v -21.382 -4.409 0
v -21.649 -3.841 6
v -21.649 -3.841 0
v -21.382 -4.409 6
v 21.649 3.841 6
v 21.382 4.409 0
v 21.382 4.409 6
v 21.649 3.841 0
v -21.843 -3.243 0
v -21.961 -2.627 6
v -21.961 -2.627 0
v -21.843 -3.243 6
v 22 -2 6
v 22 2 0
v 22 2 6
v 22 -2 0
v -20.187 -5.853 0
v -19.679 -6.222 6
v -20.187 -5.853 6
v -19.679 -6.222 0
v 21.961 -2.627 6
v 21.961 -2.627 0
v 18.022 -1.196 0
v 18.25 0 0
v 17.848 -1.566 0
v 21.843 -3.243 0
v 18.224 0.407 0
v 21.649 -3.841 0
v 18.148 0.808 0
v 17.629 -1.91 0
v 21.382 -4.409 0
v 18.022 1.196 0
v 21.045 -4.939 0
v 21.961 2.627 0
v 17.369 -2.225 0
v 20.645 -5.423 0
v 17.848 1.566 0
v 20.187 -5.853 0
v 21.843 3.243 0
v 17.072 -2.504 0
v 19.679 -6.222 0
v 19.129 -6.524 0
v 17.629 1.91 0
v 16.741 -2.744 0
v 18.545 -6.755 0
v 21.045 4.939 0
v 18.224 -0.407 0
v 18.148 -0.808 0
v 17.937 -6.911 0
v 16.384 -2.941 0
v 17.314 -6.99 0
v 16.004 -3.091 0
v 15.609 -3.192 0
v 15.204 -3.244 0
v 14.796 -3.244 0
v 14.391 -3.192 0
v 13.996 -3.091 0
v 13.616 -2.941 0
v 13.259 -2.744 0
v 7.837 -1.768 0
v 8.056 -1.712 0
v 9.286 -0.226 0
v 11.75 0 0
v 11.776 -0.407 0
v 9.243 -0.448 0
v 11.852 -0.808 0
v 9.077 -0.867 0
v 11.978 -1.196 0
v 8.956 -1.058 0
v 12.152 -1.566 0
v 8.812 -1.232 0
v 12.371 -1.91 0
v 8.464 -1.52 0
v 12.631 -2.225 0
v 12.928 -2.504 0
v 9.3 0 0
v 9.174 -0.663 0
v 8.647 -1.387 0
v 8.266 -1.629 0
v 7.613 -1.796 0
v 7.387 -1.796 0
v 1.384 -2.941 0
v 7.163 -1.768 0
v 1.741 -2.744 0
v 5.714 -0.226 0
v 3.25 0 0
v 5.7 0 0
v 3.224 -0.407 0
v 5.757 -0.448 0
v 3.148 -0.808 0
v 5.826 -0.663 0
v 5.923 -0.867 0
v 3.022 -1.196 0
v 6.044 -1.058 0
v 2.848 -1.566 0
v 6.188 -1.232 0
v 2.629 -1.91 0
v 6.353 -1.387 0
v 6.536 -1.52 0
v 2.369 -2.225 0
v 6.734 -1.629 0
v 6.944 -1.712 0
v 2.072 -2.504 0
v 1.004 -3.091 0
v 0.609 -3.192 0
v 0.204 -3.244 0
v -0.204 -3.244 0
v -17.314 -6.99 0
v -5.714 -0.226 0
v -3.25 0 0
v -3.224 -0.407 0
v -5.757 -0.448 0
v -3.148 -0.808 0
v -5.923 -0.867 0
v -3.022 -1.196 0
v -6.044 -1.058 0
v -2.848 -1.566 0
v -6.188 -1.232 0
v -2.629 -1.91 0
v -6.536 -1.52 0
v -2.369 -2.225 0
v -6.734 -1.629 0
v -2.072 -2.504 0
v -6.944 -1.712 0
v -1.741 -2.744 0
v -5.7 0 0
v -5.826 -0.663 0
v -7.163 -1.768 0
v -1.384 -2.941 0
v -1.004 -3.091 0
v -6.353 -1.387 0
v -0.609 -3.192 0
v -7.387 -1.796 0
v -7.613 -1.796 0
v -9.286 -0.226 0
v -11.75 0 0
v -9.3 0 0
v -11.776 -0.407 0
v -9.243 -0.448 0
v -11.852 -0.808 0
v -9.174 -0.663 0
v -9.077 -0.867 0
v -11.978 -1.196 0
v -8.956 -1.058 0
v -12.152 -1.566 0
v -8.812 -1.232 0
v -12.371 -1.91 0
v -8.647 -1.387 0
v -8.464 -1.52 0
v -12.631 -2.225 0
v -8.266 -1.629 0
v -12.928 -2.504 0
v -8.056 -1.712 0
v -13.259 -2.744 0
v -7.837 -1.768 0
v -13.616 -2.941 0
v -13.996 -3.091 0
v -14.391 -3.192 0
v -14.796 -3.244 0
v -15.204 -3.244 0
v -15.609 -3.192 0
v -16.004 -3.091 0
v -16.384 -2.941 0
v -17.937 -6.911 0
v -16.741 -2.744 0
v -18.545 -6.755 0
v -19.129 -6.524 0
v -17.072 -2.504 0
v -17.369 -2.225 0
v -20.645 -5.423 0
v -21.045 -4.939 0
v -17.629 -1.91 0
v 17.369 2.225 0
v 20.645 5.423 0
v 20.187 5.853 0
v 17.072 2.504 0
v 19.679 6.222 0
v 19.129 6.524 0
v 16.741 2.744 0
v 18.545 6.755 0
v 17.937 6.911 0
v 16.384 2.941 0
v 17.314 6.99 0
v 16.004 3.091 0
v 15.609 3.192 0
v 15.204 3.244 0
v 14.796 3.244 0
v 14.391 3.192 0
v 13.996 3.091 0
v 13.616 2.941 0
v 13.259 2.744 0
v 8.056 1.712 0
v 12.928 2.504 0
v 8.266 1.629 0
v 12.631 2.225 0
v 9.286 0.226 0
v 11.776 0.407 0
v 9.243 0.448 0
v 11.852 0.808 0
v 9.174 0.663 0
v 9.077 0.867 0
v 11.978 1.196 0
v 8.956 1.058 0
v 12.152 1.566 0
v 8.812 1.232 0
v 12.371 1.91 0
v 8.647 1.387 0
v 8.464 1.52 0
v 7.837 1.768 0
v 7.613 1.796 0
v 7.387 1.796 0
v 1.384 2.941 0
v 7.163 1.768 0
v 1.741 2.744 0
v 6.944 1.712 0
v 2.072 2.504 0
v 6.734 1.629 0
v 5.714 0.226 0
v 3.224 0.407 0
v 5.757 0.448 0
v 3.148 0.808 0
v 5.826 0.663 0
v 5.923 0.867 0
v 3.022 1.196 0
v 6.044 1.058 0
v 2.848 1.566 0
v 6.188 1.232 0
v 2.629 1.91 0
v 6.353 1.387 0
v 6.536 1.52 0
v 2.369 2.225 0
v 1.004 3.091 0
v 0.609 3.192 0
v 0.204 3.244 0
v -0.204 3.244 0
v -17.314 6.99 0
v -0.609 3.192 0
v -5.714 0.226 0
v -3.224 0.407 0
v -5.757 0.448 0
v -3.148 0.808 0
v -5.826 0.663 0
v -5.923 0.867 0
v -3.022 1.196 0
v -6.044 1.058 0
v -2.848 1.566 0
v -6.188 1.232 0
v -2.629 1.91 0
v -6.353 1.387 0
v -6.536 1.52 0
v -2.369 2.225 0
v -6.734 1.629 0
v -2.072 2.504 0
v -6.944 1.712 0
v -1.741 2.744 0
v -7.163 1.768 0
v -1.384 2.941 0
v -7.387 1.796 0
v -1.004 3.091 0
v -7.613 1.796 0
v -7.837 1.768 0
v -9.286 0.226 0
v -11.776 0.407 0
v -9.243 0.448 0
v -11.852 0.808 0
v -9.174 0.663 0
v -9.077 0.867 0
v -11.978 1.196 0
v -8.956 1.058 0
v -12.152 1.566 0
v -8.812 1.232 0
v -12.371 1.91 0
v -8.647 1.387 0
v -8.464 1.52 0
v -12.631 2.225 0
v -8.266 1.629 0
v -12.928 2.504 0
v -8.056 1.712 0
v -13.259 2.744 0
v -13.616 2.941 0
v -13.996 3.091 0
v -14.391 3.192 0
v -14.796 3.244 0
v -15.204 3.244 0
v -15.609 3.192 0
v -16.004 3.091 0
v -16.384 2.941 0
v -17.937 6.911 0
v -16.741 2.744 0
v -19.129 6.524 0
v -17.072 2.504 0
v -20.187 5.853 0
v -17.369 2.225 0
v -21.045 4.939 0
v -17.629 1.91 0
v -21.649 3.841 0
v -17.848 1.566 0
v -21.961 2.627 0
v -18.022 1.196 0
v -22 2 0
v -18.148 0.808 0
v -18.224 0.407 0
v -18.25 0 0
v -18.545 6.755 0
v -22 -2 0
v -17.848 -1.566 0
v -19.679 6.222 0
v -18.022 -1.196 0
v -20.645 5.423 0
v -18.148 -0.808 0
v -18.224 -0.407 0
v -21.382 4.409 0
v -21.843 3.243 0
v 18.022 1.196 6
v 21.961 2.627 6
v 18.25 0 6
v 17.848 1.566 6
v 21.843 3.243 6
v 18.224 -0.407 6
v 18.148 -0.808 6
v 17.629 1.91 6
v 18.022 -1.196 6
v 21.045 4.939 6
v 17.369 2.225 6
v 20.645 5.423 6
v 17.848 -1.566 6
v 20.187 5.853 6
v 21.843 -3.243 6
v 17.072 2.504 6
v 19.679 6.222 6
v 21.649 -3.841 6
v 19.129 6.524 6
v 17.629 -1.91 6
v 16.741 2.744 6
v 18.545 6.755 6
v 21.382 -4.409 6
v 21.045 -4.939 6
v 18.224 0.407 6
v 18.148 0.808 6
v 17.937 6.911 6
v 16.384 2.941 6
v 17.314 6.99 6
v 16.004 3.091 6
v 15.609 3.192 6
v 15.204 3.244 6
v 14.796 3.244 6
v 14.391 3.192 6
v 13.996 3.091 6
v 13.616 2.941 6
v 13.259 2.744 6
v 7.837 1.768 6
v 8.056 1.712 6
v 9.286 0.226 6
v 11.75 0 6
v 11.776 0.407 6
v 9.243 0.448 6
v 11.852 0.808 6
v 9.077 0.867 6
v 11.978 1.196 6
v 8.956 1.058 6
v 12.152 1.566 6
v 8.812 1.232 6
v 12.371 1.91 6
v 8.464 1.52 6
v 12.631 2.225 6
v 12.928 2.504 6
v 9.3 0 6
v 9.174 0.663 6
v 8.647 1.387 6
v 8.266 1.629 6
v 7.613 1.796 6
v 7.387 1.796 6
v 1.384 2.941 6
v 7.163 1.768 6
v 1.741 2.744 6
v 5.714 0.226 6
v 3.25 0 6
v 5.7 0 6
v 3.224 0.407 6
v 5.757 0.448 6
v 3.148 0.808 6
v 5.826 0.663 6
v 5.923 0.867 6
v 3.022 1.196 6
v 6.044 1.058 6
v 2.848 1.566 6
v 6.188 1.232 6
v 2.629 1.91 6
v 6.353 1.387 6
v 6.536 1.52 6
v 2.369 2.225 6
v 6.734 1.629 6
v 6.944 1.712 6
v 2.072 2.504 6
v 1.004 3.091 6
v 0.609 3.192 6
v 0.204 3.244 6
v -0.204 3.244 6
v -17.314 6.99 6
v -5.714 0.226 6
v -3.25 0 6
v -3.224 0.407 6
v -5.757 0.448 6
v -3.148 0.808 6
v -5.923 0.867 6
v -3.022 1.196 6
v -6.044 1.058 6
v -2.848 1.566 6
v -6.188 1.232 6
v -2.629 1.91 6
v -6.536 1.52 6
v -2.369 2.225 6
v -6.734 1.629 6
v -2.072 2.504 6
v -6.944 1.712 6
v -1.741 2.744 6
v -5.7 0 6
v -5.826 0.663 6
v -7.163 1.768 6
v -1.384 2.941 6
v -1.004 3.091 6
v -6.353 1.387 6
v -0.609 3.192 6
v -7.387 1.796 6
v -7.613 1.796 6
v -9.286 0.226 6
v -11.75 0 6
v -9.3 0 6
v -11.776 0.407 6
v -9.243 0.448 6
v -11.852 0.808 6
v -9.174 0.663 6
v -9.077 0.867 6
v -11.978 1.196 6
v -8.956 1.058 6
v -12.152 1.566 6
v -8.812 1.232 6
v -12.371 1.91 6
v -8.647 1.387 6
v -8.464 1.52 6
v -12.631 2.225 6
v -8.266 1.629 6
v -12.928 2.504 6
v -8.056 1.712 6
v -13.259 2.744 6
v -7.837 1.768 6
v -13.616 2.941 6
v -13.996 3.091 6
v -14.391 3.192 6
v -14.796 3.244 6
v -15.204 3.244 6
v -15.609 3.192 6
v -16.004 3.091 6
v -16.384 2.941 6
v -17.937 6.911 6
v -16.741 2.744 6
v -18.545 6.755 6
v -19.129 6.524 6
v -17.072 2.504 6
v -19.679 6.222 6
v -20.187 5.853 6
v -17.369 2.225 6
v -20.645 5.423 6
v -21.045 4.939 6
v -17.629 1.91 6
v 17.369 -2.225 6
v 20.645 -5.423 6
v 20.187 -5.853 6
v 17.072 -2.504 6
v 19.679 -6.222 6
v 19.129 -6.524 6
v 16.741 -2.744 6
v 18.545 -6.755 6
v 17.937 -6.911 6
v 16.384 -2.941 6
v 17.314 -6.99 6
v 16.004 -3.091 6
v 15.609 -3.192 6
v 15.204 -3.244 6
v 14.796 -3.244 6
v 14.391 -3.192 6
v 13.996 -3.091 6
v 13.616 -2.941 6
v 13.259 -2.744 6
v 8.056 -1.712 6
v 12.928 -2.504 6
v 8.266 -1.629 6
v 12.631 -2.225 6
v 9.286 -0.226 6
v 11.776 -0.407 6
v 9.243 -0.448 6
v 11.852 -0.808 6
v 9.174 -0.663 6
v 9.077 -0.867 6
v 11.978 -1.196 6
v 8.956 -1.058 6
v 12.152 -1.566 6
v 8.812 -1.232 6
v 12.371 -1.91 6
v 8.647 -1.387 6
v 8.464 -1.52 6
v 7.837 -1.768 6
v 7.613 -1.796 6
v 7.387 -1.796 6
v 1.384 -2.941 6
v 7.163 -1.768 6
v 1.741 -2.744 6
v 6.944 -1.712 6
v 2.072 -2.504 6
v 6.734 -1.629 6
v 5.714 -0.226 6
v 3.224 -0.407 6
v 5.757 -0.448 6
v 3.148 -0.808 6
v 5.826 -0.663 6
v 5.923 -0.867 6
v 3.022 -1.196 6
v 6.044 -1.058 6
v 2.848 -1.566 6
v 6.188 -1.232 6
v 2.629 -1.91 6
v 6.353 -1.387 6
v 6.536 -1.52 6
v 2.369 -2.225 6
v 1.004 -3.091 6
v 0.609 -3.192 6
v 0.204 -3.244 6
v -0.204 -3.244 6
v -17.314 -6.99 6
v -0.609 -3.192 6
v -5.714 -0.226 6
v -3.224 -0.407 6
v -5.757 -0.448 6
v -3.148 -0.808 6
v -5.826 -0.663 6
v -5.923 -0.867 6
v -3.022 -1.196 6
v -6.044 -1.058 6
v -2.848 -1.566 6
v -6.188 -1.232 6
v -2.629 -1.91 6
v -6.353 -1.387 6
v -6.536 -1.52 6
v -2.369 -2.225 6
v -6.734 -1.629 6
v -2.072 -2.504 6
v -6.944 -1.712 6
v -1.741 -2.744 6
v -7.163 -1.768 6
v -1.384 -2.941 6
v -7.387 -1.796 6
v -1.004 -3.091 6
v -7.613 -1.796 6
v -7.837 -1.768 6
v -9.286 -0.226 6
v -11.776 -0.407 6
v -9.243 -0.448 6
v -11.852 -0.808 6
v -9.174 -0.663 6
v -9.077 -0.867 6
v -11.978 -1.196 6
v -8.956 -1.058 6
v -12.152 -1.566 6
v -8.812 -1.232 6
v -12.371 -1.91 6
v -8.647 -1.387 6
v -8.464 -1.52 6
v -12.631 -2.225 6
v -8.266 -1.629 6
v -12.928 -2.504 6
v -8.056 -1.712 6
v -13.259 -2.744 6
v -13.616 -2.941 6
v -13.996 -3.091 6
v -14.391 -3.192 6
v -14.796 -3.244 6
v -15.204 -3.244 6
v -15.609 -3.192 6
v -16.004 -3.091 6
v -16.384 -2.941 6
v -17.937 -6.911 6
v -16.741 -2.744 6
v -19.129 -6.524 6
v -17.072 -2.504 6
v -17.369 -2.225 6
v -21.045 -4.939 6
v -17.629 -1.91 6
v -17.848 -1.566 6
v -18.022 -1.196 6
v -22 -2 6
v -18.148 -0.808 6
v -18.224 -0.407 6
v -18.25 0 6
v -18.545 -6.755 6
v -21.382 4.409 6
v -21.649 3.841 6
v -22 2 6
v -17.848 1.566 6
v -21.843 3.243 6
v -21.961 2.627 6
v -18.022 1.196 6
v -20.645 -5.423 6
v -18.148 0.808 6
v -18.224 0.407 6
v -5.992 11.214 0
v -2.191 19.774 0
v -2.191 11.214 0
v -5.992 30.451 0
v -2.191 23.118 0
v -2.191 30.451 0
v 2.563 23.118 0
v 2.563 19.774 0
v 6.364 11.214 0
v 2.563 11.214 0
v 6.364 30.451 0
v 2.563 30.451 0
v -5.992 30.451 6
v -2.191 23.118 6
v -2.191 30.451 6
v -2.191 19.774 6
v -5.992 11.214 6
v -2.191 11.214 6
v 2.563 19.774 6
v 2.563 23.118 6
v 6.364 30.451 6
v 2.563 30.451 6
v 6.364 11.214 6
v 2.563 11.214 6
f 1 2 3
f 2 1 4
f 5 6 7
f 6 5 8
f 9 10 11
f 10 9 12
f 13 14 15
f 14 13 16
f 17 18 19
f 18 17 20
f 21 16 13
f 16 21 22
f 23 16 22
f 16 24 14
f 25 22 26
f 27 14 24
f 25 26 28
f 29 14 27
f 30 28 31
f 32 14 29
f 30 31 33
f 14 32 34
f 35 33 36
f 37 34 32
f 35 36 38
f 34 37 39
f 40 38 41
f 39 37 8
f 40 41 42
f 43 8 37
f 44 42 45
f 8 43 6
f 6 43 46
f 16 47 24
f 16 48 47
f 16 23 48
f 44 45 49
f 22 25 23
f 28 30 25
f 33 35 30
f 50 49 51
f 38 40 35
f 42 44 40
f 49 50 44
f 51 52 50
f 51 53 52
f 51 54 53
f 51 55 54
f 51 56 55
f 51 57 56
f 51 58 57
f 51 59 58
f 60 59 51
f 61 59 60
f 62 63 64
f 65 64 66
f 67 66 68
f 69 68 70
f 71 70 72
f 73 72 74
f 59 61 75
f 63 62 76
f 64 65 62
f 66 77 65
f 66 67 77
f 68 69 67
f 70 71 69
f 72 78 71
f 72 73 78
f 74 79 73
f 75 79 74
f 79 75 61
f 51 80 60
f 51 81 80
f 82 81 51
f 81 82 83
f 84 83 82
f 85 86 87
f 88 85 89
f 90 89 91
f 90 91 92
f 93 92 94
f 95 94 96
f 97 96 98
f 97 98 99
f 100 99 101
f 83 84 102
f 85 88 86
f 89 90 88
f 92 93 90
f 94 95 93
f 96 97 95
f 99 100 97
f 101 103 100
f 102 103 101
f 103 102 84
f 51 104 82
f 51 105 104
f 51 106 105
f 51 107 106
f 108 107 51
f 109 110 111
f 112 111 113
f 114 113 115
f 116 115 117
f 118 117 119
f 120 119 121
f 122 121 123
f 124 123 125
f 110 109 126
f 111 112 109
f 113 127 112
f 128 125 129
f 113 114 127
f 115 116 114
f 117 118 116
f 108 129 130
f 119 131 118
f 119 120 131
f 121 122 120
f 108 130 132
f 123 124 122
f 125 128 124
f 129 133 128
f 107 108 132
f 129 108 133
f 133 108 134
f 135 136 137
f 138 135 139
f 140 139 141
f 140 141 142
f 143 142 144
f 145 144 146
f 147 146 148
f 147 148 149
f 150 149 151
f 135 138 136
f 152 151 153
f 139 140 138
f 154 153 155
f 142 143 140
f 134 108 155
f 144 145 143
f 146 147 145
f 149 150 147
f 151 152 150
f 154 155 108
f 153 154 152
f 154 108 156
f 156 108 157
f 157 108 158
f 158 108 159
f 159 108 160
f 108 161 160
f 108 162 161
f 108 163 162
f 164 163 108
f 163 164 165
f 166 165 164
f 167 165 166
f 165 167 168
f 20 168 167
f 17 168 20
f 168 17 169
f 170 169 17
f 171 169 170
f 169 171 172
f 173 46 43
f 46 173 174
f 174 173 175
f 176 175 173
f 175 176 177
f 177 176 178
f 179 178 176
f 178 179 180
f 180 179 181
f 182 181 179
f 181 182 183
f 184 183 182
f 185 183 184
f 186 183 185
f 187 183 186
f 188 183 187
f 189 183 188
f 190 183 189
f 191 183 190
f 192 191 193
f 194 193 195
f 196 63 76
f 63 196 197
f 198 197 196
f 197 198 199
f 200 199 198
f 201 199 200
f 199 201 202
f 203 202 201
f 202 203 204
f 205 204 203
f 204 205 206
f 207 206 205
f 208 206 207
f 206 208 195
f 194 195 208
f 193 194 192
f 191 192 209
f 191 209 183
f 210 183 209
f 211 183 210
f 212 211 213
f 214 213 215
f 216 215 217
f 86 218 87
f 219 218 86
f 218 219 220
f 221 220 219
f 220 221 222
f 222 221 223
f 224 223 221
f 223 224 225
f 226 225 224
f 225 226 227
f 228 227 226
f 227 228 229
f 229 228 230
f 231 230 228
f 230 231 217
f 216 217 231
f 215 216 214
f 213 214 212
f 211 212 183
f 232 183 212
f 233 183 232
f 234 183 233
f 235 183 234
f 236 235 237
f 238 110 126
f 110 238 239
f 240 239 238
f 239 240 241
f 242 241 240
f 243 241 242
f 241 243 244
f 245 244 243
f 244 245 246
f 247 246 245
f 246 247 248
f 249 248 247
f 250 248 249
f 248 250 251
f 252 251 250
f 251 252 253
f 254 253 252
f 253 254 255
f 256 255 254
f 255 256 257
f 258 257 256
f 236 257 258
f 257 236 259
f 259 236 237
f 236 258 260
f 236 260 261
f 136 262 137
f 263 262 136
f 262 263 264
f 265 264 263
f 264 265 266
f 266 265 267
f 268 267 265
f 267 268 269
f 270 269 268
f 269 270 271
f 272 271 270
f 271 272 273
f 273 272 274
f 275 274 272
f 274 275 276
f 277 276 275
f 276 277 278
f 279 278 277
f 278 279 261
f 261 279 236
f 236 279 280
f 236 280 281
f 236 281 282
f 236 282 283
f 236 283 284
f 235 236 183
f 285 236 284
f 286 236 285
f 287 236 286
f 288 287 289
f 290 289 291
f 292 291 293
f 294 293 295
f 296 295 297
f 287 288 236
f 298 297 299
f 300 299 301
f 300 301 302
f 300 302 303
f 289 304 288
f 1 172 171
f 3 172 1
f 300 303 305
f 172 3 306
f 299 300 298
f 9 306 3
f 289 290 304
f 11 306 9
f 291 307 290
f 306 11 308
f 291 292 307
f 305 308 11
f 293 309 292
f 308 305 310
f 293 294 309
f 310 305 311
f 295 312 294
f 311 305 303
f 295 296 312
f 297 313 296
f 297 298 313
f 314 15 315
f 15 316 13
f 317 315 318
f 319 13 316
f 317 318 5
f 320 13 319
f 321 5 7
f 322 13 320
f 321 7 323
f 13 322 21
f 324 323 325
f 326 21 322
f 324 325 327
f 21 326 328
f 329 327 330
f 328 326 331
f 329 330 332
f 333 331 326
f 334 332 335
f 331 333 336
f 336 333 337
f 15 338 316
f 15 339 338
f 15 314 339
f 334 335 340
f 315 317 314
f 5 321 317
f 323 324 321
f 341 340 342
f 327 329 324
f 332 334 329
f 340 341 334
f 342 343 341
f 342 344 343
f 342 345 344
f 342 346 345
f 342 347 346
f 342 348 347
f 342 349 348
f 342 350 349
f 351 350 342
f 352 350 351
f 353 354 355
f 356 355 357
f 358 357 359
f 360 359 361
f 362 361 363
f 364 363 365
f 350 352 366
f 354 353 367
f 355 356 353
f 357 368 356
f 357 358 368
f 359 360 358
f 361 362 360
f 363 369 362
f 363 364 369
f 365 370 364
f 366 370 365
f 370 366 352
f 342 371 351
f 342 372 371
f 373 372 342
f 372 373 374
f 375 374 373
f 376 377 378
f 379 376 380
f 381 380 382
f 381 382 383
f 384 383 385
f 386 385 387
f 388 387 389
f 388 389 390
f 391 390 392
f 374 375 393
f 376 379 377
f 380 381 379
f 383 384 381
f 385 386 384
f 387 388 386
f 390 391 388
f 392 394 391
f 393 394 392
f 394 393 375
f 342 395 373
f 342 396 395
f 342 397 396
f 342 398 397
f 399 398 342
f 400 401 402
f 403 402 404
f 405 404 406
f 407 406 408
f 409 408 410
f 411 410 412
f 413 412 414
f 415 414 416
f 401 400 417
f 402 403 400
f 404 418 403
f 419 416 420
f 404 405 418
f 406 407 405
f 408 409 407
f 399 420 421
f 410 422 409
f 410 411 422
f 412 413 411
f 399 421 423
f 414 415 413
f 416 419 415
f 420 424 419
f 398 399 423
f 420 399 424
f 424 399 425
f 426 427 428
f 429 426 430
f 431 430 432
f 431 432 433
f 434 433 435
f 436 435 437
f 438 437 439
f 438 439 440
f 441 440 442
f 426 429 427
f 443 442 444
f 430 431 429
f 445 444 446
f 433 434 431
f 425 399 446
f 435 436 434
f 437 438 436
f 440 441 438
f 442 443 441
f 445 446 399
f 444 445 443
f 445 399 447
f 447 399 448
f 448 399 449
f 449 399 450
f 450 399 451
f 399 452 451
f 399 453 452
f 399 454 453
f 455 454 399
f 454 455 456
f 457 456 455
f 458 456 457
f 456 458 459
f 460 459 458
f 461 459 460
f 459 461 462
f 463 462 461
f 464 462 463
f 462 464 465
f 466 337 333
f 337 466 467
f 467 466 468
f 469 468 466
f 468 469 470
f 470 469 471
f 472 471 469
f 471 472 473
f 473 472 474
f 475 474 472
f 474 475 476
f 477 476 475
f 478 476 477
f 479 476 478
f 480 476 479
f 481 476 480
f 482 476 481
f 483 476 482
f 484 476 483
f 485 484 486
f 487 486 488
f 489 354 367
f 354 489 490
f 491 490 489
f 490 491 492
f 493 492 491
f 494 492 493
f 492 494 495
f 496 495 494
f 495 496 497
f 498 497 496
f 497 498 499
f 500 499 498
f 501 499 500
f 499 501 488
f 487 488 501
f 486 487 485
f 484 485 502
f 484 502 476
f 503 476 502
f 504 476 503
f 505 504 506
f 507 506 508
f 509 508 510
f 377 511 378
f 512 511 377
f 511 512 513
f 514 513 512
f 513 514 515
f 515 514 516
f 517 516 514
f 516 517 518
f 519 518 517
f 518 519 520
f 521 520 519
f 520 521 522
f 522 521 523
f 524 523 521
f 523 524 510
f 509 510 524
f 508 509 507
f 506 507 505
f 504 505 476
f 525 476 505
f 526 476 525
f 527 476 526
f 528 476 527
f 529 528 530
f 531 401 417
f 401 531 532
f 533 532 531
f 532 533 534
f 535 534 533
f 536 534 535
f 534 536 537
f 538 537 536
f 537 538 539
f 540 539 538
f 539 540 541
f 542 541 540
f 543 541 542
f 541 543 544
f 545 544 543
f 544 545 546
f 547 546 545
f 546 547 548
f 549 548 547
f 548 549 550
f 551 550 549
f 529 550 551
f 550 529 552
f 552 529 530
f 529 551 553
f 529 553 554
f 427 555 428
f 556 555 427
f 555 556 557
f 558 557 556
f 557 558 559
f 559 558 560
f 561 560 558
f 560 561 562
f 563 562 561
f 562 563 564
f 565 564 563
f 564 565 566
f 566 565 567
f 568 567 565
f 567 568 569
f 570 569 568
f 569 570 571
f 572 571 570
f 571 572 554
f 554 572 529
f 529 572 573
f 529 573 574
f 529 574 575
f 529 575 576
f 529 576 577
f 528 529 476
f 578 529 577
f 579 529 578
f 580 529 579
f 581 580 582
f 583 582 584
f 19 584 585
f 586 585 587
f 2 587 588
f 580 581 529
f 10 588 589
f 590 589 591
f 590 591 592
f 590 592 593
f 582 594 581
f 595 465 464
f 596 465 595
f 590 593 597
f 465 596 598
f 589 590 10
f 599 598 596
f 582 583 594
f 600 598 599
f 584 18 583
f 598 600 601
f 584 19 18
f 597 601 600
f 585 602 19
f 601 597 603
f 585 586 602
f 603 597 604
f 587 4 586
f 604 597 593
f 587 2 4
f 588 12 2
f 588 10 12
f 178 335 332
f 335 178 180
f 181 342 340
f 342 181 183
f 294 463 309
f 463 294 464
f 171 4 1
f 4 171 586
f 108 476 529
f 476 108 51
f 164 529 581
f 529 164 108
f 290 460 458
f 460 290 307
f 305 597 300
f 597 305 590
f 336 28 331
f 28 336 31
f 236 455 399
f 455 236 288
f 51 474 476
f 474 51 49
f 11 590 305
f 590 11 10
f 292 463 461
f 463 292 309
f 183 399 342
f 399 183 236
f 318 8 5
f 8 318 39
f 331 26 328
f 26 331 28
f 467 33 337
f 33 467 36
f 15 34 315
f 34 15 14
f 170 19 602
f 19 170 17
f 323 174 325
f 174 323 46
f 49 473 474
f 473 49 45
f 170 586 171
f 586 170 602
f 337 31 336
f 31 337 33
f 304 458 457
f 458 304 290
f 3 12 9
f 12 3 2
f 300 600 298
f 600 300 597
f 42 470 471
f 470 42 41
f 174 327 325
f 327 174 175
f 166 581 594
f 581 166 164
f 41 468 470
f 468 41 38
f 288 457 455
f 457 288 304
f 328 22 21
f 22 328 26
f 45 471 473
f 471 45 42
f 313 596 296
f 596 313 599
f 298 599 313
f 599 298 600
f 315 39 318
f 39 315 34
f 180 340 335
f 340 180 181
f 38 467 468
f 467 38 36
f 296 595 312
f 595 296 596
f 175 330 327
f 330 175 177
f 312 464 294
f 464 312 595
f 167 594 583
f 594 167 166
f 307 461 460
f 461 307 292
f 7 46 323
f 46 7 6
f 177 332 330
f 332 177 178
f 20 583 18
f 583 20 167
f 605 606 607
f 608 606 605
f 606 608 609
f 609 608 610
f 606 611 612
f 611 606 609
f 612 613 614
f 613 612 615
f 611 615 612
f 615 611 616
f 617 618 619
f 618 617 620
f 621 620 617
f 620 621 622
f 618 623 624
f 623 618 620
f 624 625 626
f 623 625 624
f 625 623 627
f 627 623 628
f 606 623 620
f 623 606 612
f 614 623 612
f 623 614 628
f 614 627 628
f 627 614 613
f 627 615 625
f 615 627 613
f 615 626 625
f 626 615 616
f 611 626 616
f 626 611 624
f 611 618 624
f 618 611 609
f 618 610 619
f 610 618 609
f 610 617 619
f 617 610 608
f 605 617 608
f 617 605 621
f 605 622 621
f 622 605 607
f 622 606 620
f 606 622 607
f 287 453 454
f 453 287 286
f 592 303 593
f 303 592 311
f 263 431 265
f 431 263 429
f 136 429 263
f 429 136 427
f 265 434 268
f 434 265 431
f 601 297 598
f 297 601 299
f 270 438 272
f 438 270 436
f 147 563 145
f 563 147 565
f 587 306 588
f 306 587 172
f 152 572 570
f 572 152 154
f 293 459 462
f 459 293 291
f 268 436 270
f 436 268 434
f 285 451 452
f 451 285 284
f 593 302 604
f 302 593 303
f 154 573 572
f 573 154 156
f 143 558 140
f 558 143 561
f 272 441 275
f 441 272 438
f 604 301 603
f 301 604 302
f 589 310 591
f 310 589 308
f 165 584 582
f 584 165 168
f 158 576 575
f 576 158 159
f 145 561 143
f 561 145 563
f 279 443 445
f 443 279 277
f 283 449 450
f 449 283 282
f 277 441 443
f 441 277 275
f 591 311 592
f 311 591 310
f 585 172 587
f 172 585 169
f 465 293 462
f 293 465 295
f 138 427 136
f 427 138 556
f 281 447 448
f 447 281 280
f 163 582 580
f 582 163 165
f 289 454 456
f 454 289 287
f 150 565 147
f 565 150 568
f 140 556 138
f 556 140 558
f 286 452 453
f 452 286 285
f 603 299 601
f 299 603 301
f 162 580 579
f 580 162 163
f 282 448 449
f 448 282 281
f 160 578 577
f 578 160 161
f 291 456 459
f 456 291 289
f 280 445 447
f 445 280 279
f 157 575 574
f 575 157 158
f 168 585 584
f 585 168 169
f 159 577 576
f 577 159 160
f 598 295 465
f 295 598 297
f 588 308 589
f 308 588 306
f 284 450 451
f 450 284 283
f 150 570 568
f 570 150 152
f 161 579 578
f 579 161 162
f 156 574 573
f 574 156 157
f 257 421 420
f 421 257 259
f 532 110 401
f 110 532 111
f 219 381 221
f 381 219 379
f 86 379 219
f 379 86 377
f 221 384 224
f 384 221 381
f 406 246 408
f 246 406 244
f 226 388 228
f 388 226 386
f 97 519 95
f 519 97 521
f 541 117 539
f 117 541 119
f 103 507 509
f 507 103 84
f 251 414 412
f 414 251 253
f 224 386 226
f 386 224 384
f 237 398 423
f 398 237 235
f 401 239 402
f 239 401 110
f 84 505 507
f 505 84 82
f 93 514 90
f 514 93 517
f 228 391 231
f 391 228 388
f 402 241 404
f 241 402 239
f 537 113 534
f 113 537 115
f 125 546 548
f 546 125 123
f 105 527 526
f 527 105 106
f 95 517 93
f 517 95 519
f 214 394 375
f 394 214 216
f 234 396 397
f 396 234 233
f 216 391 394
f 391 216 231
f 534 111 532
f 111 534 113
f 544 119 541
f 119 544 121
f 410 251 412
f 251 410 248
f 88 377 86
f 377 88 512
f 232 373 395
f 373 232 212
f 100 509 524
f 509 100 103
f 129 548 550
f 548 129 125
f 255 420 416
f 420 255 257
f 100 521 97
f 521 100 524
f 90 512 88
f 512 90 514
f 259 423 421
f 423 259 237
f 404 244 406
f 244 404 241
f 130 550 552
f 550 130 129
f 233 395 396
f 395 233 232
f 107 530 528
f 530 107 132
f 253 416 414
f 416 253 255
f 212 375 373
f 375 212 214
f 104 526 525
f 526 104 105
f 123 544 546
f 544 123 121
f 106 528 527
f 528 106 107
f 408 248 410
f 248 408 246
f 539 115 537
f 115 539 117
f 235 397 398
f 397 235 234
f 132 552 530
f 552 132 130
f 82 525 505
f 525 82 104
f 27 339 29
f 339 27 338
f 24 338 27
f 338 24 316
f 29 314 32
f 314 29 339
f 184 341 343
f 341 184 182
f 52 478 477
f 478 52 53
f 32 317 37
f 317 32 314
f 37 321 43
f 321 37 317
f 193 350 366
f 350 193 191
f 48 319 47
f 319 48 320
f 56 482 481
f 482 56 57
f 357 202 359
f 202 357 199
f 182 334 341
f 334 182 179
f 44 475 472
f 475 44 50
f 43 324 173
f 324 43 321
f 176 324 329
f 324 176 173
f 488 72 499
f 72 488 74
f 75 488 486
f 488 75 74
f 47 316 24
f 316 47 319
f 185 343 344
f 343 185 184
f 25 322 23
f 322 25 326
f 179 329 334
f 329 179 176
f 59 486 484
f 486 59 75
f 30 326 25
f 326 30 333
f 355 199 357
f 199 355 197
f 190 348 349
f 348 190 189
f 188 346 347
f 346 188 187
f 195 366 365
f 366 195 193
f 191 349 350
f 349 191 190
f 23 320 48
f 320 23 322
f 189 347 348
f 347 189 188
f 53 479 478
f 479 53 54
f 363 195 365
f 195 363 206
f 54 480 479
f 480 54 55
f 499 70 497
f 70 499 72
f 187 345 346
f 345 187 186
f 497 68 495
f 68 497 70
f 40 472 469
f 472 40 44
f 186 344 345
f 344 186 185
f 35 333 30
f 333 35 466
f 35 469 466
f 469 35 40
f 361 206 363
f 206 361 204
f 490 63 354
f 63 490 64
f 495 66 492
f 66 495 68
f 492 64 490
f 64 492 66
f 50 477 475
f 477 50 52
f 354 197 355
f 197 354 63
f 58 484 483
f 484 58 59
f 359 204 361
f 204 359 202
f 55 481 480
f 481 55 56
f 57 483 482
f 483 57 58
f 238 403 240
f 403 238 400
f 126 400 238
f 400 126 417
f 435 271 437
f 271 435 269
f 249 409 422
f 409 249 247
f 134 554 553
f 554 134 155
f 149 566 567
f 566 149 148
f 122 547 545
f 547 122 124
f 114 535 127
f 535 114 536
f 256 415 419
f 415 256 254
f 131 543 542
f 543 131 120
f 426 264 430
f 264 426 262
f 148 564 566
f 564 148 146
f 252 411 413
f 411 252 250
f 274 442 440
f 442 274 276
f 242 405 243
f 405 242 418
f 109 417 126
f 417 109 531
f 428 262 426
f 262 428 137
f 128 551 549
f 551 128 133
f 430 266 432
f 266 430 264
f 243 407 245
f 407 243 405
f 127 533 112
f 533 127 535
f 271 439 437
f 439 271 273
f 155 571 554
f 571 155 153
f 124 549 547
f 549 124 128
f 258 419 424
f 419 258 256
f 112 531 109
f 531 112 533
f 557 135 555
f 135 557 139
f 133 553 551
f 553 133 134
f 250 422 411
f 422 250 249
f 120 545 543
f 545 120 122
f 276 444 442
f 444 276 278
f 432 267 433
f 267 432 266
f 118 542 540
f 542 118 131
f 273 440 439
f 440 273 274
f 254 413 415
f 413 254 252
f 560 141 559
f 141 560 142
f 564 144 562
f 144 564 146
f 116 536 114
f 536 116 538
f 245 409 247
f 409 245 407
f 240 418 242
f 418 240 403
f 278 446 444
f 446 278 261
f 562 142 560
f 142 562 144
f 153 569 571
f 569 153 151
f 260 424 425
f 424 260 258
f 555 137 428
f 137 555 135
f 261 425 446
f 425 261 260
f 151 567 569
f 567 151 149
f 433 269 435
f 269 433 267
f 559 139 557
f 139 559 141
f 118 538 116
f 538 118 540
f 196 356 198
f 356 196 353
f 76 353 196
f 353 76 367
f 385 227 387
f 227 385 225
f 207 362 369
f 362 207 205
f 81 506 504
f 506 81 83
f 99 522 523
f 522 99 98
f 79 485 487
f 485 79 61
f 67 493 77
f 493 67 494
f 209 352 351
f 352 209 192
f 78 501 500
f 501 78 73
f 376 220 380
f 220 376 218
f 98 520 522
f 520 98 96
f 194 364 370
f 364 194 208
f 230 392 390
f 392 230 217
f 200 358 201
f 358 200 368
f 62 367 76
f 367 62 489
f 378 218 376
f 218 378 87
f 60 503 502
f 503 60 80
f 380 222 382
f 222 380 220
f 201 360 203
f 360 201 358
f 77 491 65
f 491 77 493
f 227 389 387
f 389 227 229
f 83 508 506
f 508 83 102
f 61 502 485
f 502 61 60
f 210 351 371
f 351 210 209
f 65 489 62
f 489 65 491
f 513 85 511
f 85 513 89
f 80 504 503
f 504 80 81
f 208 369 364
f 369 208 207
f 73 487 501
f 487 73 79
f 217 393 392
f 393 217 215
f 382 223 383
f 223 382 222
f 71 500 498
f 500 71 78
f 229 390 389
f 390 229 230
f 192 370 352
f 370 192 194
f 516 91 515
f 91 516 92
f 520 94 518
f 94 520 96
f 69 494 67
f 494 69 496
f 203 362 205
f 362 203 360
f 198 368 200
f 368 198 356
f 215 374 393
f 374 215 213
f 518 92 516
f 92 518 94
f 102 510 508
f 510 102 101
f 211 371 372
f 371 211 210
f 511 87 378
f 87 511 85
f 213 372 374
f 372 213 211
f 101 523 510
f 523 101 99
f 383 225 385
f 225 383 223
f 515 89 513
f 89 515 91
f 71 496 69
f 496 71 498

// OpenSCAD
$fn = 50;


difference() {
	union() {
		hull() {
			translate(v = [-17.0000000000, 2.0000000000, 0]) {
				cylinder(h = 6, r = 5);
			}
			translate(v = [17.0000000000, 2.0000000000, 0]) {
				cylinder(h = 6, r = 5);
			}
			translate(v = [-17.0000000000, -2.0000000000, 0]) {
				cylinder(h = 6, r = 5);
			}
			translate(v = [17.0000000000, -2.0000000000, 0]) {
				cylinder(h = 6, r = 5);
			}
		}
		translate(v = [0, 30.0000000000, 0]) {
			linear_extrude(height = 6) {
				text(font = "DejaVu Sans Mono:style=Bold", halign = "center", size = 19.0000000000, text = "H", valign = "top");
			}
		}
	}
	union() {
		translate(v = [-15.0000000000, 0.0000000000, 0]) {
			translate(v = [0, 0, -100]) {
				cylinder(h = 200, r = 3.2500000000);
			}
		}
		translate(v = [0, 0, -100]) {
			cylinder(h = 200, r = 3.2500000000);
		}
		translate(v = [15.0000000000, 0.0000000000, 0]) {
			translate(v = [0, 0, -100]) {
				cylinder(h = 200, r = 3.2500000000);
			}
		}
		translate(v = [-15.0000000000, 0.0000000000, 0]) {
			translate(v = [0, 0, -100]) {
				cylinder(h = 200, r = 1.8000000000);
			}
		}
		translate(v = [-7.5000000000, 0.0000000000, 0]) {
			translate(v = [0, 0, -100]) {
				cylinder(h = 200, r = 1.8000000000);
			}
		}
		translate(v = [0, 0, -100]) {
			cylinder(h = 200, r = 1.8000000000);
		}
		translate(v = [7.5000000000, 0.0000000000, 0]) {
			translate(v = [0, 0, -100]) {
				cylinder(h = 200, r = 1.8000000000);
			}
		}
		translate(v = [15.0000000000, 0.0000000000, 0]) {
			translate(v = [0, 0, -100]) {
				cylinder(h = 200, r = 1.8000000000);
			}
		}
	}
}
